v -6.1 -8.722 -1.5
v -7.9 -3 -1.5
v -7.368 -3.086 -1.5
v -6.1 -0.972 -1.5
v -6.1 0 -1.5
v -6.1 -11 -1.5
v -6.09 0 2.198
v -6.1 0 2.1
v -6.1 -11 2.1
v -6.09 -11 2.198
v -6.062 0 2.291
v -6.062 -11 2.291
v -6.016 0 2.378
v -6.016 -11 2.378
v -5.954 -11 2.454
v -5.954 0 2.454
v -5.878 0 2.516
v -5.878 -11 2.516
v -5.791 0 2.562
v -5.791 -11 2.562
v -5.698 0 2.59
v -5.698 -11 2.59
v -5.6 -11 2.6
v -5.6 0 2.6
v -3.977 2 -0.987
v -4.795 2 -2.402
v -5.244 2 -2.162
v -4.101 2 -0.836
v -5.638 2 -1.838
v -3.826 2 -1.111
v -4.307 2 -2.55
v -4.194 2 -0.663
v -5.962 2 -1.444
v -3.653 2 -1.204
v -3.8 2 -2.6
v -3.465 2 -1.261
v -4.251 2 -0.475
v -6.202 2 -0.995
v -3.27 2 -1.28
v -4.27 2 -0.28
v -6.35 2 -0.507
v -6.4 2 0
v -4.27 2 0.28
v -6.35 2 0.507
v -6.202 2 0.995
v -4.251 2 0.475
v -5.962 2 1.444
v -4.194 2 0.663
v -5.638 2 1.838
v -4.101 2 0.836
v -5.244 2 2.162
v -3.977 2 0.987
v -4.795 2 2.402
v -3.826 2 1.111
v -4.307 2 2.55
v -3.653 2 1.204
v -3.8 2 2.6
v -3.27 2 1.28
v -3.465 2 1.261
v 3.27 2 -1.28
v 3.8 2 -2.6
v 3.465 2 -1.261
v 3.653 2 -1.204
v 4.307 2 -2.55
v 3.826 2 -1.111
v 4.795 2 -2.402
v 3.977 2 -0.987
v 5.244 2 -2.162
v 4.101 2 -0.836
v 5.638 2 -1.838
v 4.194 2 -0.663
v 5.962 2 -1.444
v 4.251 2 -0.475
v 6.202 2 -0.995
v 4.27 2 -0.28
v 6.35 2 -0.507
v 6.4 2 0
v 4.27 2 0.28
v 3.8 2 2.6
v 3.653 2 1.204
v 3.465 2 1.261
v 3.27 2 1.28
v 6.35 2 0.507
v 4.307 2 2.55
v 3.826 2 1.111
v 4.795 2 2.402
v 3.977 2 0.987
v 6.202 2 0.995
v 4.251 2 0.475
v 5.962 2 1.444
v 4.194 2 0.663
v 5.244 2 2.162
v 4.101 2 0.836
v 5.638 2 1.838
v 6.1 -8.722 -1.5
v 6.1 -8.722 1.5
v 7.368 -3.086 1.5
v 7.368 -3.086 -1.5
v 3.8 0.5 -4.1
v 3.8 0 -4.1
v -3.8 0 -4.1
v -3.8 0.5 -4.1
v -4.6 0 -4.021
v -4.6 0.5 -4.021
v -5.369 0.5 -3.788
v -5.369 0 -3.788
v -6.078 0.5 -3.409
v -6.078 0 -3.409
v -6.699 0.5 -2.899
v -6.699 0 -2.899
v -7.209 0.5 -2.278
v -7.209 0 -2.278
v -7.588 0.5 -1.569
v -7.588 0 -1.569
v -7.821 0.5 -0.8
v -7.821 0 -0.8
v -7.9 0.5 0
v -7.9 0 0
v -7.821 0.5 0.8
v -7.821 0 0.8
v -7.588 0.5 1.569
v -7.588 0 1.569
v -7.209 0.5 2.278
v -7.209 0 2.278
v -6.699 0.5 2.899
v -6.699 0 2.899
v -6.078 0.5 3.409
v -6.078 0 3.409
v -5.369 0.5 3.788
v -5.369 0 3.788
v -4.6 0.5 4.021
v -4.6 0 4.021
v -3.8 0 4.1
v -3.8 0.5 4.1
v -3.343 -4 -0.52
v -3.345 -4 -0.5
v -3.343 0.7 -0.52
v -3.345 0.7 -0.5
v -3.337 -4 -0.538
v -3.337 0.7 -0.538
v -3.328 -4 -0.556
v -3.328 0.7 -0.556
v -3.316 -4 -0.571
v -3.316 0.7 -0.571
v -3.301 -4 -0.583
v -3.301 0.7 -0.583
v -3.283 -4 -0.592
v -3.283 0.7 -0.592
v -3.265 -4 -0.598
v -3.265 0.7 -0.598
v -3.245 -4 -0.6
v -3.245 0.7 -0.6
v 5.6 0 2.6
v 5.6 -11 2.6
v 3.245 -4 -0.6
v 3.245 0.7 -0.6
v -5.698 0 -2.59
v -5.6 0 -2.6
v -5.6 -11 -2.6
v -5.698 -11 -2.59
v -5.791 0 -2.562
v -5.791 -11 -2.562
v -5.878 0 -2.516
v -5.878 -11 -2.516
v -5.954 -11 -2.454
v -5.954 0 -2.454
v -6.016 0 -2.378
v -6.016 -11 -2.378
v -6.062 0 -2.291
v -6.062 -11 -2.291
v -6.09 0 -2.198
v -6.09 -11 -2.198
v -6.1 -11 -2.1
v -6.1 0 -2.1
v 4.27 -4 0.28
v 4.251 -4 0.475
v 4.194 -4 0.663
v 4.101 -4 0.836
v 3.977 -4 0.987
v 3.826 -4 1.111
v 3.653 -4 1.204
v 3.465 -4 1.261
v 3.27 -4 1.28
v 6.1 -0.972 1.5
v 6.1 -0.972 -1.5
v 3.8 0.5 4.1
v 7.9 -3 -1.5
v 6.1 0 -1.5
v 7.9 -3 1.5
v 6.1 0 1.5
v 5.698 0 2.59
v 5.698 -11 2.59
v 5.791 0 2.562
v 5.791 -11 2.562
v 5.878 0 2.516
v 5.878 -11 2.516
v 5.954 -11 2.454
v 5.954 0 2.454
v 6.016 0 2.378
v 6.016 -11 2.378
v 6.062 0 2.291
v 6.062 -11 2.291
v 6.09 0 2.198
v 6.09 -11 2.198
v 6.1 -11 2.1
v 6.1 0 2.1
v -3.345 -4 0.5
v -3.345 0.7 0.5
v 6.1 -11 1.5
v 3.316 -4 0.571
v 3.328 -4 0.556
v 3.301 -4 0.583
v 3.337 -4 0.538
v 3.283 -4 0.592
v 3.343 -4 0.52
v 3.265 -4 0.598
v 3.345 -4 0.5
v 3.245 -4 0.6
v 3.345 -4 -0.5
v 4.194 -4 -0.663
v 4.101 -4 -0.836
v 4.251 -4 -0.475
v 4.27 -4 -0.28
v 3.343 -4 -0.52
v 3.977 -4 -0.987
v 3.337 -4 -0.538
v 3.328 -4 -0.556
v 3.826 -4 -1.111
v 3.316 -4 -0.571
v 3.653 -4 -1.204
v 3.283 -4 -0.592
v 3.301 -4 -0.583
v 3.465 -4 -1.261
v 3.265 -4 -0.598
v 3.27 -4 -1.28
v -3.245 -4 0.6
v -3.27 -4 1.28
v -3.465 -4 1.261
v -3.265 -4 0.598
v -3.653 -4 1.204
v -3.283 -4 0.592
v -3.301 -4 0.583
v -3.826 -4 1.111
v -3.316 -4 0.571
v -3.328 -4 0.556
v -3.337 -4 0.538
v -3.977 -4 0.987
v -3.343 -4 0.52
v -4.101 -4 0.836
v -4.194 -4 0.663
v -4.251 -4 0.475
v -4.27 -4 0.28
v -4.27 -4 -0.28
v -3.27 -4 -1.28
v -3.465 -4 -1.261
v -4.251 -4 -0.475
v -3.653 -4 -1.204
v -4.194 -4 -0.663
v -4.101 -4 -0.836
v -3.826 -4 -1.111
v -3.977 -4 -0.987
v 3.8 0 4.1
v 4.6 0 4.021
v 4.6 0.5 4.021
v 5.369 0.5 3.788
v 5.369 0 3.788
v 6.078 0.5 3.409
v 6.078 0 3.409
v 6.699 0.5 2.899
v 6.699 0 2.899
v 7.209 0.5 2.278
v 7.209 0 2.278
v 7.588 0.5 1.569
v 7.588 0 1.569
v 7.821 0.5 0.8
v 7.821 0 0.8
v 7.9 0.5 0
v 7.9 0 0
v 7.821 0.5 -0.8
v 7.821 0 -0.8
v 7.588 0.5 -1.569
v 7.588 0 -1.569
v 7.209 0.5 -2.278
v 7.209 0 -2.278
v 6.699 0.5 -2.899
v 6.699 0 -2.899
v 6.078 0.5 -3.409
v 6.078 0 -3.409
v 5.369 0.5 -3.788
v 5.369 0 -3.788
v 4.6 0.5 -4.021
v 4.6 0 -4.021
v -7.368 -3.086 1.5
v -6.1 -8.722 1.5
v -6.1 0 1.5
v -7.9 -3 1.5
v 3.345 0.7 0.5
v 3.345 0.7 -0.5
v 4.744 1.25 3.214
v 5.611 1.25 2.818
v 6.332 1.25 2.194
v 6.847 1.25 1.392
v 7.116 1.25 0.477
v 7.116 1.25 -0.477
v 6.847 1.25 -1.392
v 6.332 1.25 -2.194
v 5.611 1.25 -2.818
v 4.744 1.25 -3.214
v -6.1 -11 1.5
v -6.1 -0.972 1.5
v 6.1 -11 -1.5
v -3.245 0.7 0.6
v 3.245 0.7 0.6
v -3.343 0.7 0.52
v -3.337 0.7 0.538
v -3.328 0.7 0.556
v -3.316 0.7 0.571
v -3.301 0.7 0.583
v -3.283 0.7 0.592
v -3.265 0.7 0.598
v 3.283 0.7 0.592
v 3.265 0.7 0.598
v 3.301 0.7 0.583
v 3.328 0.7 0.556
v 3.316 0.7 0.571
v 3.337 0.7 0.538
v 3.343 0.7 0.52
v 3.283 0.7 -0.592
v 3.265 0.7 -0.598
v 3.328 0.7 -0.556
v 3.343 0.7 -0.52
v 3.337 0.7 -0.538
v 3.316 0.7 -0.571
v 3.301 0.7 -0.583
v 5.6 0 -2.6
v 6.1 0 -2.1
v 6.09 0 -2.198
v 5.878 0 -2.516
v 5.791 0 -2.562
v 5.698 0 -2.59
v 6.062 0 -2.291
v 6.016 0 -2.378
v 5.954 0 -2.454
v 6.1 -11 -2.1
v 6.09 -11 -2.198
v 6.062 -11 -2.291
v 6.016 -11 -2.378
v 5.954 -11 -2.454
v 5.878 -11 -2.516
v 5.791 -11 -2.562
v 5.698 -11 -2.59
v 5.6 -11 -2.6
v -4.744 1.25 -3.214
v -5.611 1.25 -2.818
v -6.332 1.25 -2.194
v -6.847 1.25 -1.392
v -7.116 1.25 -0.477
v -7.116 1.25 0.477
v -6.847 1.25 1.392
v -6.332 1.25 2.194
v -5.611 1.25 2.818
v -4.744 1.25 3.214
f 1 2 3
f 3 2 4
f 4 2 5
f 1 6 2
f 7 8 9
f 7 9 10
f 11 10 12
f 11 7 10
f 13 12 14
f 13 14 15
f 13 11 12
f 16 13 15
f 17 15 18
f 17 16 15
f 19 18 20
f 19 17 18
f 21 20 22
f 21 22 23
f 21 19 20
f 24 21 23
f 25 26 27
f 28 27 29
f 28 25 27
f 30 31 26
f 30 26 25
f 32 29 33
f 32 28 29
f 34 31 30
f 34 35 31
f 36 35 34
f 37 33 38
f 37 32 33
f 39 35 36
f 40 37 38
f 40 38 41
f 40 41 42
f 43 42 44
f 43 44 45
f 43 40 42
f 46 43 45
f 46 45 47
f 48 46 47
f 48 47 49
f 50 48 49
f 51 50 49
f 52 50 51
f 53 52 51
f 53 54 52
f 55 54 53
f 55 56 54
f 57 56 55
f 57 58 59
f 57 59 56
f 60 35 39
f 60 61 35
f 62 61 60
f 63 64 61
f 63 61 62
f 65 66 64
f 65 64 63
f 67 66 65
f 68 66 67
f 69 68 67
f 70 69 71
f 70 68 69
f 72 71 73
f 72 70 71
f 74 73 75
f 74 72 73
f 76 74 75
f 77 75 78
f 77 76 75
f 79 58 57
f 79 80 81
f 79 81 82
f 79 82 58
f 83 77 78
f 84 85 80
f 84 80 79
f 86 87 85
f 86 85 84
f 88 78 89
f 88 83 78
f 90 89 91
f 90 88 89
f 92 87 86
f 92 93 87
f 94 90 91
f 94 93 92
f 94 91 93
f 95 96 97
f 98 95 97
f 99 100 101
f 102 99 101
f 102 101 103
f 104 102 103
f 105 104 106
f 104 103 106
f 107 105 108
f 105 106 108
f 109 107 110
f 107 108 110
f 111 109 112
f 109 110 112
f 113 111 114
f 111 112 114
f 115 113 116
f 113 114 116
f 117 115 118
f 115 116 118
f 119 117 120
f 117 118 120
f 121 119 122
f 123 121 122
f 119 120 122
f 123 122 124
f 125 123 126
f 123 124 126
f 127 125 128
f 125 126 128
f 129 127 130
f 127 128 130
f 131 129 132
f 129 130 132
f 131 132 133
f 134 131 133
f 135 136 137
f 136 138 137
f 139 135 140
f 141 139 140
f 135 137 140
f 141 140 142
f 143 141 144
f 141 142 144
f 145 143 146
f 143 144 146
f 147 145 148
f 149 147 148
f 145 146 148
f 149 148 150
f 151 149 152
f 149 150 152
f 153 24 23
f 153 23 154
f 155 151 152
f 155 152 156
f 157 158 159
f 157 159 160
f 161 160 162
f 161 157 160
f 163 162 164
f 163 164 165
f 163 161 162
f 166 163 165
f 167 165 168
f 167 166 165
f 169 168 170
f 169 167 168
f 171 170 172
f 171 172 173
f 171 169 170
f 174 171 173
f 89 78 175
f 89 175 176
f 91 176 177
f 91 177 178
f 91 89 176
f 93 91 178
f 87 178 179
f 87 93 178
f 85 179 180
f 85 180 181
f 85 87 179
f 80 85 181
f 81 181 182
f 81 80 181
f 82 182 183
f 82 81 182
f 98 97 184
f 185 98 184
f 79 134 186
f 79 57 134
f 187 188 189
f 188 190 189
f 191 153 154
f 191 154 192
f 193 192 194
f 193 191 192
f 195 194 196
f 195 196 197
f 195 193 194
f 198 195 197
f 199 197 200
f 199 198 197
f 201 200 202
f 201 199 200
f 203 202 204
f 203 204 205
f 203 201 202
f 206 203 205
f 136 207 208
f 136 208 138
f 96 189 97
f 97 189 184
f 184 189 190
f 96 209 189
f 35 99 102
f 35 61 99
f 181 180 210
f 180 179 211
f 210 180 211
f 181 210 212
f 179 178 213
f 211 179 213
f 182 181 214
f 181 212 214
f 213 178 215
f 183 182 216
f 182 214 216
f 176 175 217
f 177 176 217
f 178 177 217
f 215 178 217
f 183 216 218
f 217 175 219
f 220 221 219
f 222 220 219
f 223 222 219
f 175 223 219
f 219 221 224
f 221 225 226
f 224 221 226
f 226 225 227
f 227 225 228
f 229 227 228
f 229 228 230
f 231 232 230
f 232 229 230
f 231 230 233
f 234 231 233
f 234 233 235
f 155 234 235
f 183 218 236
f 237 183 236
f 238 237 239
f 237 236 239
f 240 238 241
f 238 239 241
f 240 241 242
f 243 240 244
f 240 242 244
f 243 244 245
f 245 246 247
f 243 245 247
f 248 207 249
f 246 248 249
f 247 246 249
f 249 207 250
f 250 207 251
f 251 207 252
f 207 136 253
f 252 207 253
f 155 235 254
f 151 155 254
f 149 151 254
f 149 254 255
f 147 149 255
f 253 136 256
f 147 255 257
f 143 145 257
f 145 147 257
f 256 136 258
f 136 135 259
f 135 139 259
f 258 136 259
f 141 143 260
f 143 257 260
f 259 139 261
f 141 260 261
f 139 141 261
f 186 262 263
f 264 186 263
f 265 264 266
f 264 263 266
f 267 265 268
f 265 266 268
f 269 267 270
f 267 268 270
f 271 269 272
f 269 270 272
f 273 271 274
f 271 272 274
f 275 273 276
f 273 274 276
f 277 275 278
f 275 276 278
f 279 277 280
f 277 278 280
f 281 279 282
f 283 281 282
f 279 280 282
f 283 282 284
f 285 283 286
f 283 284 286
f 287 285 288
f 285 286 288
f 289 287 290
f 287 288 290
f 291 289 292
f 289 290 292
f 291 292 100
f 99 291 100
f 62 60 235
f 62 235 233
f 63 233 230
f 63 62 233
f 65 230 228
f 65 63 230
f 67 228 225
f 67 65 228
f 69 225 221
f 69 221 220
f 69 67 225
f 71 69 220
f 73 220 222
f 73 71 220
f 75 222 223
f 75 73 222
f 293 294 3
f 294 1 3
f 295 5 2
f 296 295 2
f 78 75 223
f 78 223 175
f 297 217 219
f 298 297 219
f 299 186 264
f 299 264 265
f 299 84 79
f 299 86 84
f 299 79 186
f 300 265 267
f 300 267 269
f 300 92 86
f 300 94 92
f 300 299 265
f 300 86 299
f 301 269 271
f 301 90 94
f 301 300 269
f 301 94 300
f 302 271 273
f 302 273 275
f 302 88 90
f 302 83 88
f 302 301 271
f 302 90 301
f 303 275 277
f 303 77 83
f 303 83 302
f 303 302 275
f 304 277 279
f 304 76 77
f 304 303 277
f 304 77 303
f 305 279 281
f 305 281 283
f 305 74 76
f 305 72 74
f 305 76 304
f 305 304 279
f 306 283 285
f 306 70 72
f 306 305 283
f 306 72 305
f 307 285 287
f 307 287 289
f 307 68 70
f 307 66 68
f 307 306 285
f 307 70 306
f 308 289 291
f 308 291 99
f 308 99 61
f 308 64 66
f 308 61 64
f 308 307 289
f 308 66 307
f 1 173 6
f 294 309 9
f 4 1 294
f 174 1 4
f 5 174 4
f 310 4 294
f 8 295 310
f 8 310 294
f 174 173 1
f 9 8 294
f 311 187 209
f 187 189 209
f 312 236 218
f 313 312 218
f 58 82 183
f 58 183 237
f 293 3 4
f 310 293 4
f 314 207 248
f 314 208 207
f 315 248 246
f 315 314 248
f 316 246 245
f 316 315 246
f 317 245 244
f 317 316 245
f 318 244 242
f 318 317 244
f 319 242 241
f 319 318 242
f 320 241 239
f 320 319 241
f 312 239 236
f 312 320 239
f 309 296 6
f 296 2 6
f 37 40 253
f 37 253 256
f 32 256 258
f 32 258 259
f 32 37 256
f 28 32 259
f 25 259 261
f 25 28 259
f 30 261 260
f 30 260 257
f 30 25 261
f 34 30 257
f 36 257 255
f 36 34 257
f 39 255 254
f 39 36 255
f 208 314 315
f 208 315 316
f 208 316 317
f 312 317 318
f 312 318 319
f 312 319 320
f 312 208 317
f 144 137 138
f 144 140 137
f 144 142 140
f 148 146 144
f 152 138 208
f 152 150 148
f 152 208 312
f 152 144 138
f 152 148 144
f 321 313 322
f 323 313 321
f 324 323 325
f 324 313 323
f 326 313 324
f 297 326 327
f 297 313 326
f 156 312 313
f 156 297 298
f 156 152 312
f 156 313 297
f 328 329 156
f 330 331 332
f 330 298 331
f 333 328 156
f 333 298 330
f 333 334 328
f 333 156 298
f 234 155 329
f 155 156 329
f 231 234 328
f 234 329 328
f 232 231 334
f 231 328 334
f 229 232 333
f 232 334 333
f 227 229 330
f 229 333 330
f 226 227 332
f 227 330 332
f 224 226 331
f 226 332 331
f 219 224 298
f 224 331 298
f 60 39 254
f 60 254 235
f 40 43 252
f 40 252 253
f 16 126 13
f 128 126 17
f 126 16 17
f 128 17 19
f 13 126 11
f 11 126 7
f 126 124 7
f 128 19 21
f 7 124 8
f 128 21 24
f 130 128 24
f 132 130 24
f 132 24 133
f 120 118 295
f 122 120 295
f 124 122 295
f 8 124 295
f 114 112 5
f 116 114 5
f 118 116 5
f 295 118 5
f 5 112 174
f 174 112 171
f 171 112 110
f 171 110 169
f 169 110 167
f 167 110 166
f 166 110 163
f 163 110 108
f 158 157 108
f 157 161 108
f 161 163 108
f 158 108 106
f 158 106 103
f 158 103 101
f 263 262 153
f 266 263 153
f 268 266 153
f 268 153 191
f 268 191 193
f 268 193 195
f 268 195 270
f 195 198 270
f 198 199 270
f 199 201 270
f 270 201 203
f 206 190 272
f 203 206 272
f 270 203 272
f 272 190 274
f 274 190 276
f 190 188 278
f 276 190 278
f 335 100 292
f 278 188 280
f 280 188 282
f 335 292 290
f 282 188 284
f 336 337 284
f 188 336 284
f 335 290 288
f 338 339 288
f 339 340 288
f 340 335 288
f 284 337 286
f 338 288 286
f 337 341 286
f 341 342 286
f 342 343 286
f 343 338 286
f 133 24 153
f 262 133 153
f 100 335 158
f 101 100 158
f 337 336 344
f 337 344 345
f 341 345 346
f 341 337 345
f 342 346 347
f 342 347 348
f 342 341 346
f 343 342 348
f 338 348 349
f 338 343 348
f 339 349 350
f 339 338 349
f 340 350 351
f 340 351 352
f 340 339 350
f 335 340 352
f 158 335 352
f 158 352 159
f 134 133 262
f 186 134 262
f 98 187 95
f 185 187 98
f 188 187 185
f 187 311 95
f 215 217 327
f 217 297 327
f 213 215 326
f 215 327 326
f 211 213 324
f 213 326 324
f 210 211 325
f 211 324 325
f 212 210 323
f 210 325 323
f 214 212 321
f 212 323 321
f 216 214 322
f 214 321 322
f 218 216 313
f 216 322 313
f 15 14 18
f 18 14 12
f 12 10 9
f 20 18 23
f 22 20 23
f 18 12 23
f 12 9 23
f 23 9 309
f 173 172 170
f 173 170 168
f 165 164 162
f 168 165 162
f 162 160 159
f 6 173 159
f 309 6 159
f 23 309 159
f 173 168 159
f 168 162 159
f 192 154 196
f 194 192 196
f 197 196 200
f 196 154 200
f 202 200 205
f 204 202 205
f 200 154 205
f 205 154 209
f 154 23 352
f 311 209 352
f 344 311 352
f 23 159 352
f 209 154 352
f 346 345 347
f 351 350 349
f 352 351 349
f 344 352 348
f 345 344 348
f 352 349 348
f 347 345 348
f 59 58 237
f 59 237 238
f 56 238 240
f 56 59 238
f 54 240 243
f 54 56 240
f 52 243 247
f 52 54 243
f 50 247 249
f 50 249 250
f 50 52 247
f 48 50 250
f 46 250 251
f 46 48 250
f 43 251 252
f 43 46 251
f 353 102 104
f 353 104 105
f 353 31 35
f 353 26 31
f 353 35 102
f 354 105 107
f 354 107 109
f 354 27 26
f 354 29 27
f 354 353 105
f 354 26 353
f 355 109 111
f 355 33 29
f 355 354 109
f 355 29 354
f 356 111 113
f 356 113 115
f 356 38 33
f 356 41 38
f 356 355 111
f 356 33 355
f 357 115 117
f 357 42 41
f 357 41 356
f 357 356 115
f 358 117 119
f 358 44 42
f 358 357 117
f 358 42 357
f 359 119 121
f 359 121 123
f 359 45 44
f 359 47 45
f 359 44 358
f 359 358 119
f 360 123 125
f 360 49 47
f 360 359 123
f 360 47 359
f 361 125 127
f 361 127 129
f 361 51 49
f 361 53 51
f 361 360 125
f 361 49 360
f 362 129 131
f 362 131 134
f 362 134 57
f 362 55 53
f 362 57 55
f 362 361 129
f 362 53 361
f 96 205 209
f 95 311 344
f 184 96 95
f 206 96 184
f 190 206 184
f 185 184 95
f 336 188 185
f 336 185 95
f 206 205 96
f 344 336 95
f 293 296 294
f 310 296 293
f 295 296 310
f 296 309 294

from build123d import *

# Parameters (mm, degrees)
SALIENTE_EXTRUIR1_DEPTH = 11
SALIENTE_EXTRUIR2_DEPTH = 0.5
SALIENTE_EXTRUIR3_DEPTH = 1.5
SALIENTE_EXTRUIR3_TAPER = 45
CORTAR_EXTRUIR1_DEPTH   = 6
CROQUIS7_W              = 6.69
CROQUIS7_H              = 1.2
SALIENTE_EXTRUIR4_DEPTH = 4.7
REDONDEO1_R             = 0.1
SALIENTE_EXTRUIR5_DEPTH = 1.5


with BuildPart() as part:
    # Croquis1 → Saliente-Extruir1 (new body)
    with BuildSketch(Plane(origin=(0, 0, 0), x_dir=(1, 0, 0), z_dir=(0, 1, 0))):
        with BuildLine():
            Line((-5.6, -2.6), (5.6, -2.6))
            ThreePointArc((5.6, -2.6), (5.953553391, -2.453553391), (6.1, -2.1))
            Line((6.1, -2.1), (6.1, 2.1))
            ThreePointArc((6.1, 2.1), (5.953553391, 2.453553391), (5.6, 2.6))
            Line((5.6, 2.6), (-5.6, 2.6))
            ThreePointArc((-5.6, 2.6), (-5.953553391, 2.453553391), (-6.1, 2.1))
            Line((-6.1, 2.1), (-6.1, -2.1))
            ThreePointArc((-6.1, -2.1), (-5.953553391, -2.453553391), (-5.6, -2.6))
        make_face()
    extrude(amount=-SALIENTE_EXTRUIR1_DEPTH)

    # Croquis2 → Saliente-Extruir2 (add)
    with BuildSketch(Plane(origin=(0, 0, 0), x_dir=(1, 0, 0), z_dir=(0, 1, 0))):
        with BuildLine():
            Line((-3.8, -4.1), (3.8, -4.1))
            ThreePointArc((3.8, -4.1), (7.9, 0), (3.8, 4.1))
            Line((3.8, 4.1), (-3.8, 4.1))
            ThreePointArc((-3.8, 4.1), (-7.9, 0), (-3.8, -4.1))
        make_face()
    extrude(amount=SALIENTE_EXTRUIR2_DEPTH)

    # Croquis3 → Saliente-Extruir3 (add)
    with BuildSketch(Plane(origin=(0, 0.5, 0), x_dir=(1, 0, 0), z_dir=(0, 1, 0))):
        with BuildLine():
            Line((-3.8, -4.1), (3.8, -4.1))
            ThreePointArc((3.8, -4.1), (7.9, 0), (3.8, 4.1))
            Line((3.8, 4.1), (-3.8, 4.1))
            ThreePointArc((-3.8, 4.1), (-7.9, 0), (-3.8, -4.1))
        make_face()
    extrude(amount=SALIENTE_EXTRUIR3_DEPTH, taper=SALIENTE_EXTRUIR3_TAPER)

    # Croquis6 → Cortar-Extruir1 (cut)
    with BuildSketch(Plane(origin=(0, 2, 0), x_dir=(1, 0, 0), z_dir=(0, 1, 0))):
        with BuildLine():
            Line((-3.27, 1.28), (3.27, 1.28))
            ThreePointArc((3.27, 1.28), (3.977106781, 0.987106781), (4.27, 0.28))
            Line((4.27, 0.28), (4.27, -0.28))
            ThreePointArc((4.27, -0.28), (3.977106781, -0.987106781), (3.27, -1.28))
            Line((3.27, -1.28), (-3.27, -1.28))
            ThreePointArc((-3.27, -1.28), (-3.977106781, -0.987106781), (-4.27, -0.28))
            Line((-4.27, -0.28), (-4.27, 0.28))
            ThreePointArc((-4.27, 0.28), (-3.977106781, 0.987106781), (-3.27, 1.28))
        make_face()
    extrude(amount=-CORTAR_EXTRUIR1_DEPTH, mode=Mode.SUBTRACT)

    # Croquis7 → Saliente-Extruir4 (add)
    with BuildSketch(Plane(origin=(0, -4, 0), x_dir=(1, 0, 0), z_dir=(0, 1, 0))):
        Rectangle(CROQUIS7_W, CROQUIS7_H)
    extrude(amount=SALIENTE_EXTRUIR4_DEPTH)

    # Redondeo1
    redondeo1_edges = [part.edges().sort_by_distance(p)[0] for p in [
        (3.345, -1.65, 0.6),
        (3.345, -1.65, -0.6),
        (-3.345, -1.65, -0.6),
        (-3.345, -1.65, 0.6),
    ]]
    fillet(redondeo1_edges, radius=REDONDEO1_R)

    # Croquis8 → Saliente-Extruir5 (add, symmetric)
    with BuildSketch(Plane.XY):
        Polygon((-6.1, 0), (-7.9, -3), (-6.1, -11), (-6.1, -8.722222222), (-7.368246767, -3.085569927), (-6.1, -0.971825316), align=None)
        Polygon((6.1, -0.971825316), (6.1, 0), (7.9, -3), (6.1, -11), (6.1, -8.722222222), (7.368246767, -3.085569927), align=None)
    extrude(amount=SALIENTE_EXTRUIR5_DEPTH, both=True)


solid = part.part
